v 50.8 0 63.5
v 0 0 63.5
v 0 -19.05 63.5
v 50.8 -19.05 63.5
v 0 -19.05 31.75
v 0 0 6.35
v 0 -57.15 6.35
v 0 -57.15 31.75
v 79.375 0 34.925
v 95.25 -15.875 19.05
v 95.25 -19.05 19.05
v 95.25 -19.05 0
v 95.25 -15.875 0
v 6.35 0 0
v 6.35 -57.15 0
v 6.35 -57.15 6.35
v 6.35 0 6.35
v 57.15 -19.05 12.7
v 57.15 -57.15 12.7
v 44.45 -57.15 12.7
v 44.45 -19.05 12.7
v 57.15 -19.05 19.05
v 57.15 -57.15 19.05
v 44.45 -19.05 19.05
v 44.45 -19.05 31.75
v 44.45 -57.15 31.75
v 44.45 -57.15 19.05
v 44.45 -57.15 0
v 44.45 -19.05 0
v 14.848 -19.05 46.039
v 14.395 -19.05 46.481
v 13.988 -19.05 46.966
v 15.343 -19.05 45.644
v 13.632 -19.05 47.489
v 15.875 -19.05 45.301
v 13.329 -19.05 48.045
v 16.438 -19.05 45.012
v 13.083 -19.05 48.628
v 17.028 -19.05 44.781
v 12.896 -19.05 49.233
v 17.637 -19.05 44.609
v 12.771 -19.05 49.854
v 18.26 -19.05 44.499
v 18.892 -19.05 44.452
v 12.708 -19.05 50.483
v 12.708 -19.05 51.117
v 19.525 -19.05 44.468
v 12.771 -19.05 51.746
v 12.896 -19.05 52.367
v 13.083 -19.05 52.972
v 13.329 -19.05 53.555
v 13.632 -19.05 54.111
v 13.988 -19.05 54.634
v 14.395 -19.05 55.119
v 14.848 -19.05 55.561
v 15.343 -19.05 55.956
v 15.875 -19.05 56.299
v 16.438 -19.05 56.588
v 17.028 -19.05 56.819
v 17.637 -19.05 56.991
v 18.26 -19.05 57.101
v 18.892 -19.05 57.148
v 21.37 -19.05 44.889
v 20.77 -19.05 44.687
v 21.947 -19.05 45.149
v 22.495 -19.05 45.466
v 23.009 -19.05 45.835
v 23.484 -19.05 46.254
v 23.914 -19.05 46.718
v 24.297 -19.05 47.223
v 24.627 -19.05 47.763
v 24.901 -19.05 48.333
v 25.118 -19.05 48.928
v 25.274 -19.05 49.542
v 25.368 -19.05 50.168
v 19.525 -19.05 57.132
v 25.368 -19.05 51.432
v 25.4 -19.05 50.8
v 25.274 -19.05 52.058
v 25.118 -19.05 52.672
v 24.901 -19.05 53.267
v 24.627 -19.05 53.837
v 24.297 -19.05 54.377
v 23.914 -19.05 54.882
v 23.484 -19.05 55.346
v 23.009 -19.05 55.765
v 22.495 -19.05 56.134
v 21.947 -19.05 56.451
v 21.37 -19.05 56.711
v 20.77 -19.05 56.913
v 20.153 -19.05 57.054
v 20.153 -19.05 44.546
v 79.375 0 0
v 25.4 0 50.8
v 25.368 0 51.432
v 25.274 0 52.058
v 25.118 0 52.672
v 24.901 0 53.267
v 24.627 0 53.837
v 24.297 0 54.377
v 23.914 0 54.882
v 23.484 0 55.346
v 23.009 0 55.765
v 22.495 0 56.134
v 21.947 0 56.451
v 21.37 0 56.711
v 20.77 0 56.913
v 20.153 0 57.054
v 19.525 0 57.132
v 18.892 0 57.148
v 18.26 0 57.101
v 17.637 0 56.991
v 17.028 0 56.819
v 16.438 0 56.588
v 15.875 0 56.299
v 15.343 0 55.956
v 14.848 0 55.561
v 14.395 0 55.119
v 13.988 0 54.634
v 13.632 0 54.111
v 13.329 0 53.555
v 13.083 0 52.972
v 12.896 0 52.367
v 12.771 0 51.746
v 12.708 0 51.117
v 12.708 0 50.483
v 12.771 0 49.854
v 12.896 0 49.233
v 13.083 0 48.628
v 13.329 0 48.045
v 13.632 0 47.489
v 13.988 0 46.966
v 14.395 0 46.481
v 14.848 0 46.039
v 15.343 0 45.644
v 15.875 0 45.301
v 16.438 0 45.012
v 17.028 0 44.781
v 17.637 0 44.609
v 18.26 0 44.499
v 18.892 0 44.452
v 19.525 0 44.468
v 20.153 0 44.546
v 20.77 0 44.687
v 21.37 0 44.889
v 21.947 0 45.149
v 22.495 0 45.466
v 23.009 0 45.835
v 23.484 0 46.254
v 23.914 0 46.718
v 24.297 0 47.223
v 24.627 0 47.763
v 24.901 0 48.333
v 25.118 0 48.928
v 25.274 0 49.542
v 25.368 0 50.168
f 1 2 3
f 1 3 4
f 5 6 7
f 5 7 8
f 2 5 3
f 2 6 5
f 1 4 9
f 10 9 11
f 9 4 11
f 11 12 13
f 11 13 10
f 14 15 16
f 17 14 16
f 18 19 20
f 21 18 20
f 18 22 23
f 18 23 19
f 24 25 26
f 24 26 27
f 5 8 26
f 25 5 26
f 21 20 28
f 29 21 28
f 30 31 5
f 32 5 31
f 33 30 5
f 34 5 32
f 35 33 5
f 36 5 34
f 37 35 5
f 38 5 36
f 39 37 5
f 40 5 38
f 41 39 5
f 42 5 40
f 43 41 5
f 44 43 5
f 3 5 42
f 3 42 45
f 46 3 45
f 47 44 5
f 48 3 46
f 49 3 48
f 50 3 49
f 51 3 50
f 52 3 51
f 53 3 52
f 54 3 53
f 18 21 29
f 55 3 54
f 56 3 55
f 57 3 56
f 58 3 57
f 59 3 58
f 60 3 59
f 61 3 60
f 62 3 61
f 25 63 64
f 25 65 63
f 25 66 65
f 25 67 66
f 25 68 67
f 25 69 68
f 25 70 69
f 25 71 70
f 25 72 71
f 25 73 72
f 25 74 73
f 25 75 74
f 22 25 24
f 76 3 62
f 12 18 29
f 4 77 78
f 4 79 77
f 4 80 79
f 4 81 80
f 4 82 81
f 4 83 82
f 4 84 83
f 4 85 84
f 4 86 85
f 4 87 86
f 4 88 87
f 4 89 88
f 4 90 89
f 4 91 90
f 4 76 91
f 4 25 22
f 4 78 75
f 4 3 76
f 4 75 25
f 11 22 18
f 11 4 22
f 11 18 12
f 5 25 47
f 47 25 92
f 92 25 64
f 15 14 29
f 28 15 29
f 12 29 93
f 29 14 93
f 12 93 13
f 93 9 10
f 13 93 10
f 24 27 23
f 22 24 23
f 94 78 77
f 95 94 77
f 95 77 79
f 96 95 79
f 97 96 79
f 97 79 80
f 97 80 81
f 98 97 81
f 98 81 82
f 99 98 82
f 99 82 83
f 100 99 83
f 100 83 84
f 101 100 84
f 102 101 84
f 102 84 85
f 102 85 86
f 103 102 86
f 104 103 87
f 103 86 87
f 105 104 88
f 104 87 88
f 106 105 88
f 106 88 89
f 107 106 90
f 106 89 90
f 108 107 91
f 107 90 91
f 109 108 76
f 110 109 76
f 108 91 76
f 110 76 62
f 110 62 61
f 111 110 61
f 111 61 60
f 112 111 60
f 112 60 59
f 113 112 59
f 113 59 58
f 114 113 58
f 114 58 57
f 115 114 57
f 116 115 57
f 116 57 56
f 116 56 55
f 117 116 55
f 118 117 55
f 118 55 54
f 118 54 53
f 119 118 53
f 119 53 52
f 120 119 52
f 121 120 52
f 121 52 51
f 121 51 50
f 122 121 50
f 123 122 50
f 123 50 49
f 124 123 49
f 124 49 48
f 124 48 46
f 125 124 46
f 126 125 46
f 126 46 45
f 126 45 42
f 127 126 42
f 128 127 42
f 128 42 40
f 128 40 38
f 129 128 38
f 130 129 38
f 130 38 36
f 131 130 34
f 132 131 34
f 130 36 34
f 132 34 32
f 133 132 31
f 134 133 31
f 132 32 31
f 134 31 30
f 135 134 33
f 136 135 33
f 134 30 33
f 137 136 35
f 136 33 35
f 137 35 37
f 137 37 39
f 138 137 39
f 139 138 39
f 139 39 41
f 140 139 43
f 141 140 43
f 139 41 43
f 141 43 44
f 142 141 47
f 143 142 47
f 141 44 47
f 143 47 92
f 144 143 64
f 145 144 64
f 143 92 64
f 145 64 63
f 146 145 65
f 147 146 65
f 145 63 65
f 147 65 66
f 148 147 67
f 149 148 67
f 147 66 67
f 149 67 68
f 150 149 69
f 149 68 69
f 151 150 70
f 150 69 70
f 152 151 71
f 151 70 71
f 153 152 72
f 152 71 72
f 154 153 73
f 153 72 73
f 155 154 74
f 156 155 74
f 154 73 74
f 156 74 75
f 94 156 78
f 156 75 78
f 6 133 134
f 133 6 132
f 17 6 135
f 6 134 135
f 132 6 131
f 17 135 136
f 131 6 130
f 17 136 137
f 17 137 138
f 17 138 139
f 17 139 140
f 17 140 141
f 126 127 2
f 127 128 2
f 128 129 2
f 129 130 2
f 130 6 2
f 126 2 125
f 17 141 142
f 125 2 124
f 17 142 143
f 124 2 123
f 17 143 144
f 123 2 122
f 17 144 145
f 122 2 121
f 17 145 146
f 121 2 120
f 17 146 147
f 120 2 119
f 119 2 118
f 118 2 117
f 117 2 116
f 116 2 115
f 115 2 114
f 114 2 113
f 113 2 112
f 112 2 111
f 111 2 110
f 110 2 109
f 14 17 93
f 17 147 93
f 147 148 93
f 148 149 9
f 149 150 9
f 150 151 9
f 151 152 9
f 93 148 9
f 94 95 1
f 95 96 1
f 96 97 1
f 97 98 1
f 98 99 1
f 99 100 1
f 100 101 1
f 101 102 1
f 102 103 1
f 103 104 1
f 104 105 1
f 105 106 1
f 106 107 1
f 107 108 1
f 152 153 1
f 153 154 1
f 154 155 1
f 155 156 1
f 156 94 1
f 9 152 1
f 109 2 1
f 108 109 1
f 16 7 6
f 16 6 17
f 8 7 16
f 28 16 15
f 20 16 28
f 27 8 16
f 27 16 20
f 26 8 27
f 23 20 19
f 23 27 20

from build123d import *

# Parameters (mm, degrees)
F0_W      = 107.95
F0_H      = 63.5
F1_DEPTH  = 57.15
F2_W      = 6.35
F2_H      = 6.35
F3_DEPTH  = 57.151
F4_W      = 12.7
F4_H      = 63.5
F5_DEPTH  = 57.151
F7_DEPTH  = 63.501
F9_DEPTH  = 38.1
F11_DEPTH = 25.4
F12_R     = 6.35
F13_DEPTH = 25.4


with BuildPart() as f1:
    # F0 (on Front) → F1 (new body)
    with BuildSketch(Plane.XZ):
        with Locations((53.975, 31.75)):
            Rectangle(F0_W, F0_H)
    extrude(amount=F1_DEPTH)

    # F2 (on face) → F3 (cut, through all)
    with BuildSketch(Plane.XZ.offset(57.15)):
        with Locations((3.175, 3.175)):
            Rectangle(F2_W, F2_H)
    extrude(amount=-F3_DEPTH, mode=Mode.SUBTRACT)

    # F4 (on face) → F5 (cut, through all)
    with BuildSketch(Plane.XZ.offset(57.15)):
        with Locations((101.6, 31.75)):
            Rectangle(F4_W, F4_H)
    extrude(amount=-F5_DEPTH, mode=Mode.SUBTRACT)

    # F6 (on face) → F7 (cut, through all)
    with BuildSketch(Plane.XY.offset(63.5)):
        Polygon((95.25, -15.875), (95.25, 0), (79.375, 0), align=None)
    extrude(amount=-F7_DEPTH, mode=Mode.SUBTRACT)

    # F8 (on face) → F9 (cut)
    with BuildSketch(Plane.XZ.offset(57.15)):
        Polygon((95.25, 63.5), (0, 63.5), (0, 31.75), (44.45, 31.75), (44.45, 19.05), (57.15, 19.05), (57.15, 12.7), (44.45, 12.7), (44.45, 0), (95.25, 0), align=None)
    extrude(amount=-F9_DEPTH, mode=Mode.SUBTRACT)

    # F10 (on face) → F11 (cut)
    with BuildSketch(Plane.XZ.offset(19.05)):
        Polygon((95.25, 19.05), (95.25, 63.5), (50.8, 63.5), align=None)
    extrude(amount=-F11_DEPTH, mode=Mode.SUBTRACT)

    # F12 (on face) → F13 (cut)
    with BuildSketch(Plane.XZ.offset(19.05)):
        with Locations((19.05, 50.8)):
            Circle(F12_R)
    extrude(amount=-F13_DEPTH, mode=Mode.SUBTRACT)


solid = f1.part
